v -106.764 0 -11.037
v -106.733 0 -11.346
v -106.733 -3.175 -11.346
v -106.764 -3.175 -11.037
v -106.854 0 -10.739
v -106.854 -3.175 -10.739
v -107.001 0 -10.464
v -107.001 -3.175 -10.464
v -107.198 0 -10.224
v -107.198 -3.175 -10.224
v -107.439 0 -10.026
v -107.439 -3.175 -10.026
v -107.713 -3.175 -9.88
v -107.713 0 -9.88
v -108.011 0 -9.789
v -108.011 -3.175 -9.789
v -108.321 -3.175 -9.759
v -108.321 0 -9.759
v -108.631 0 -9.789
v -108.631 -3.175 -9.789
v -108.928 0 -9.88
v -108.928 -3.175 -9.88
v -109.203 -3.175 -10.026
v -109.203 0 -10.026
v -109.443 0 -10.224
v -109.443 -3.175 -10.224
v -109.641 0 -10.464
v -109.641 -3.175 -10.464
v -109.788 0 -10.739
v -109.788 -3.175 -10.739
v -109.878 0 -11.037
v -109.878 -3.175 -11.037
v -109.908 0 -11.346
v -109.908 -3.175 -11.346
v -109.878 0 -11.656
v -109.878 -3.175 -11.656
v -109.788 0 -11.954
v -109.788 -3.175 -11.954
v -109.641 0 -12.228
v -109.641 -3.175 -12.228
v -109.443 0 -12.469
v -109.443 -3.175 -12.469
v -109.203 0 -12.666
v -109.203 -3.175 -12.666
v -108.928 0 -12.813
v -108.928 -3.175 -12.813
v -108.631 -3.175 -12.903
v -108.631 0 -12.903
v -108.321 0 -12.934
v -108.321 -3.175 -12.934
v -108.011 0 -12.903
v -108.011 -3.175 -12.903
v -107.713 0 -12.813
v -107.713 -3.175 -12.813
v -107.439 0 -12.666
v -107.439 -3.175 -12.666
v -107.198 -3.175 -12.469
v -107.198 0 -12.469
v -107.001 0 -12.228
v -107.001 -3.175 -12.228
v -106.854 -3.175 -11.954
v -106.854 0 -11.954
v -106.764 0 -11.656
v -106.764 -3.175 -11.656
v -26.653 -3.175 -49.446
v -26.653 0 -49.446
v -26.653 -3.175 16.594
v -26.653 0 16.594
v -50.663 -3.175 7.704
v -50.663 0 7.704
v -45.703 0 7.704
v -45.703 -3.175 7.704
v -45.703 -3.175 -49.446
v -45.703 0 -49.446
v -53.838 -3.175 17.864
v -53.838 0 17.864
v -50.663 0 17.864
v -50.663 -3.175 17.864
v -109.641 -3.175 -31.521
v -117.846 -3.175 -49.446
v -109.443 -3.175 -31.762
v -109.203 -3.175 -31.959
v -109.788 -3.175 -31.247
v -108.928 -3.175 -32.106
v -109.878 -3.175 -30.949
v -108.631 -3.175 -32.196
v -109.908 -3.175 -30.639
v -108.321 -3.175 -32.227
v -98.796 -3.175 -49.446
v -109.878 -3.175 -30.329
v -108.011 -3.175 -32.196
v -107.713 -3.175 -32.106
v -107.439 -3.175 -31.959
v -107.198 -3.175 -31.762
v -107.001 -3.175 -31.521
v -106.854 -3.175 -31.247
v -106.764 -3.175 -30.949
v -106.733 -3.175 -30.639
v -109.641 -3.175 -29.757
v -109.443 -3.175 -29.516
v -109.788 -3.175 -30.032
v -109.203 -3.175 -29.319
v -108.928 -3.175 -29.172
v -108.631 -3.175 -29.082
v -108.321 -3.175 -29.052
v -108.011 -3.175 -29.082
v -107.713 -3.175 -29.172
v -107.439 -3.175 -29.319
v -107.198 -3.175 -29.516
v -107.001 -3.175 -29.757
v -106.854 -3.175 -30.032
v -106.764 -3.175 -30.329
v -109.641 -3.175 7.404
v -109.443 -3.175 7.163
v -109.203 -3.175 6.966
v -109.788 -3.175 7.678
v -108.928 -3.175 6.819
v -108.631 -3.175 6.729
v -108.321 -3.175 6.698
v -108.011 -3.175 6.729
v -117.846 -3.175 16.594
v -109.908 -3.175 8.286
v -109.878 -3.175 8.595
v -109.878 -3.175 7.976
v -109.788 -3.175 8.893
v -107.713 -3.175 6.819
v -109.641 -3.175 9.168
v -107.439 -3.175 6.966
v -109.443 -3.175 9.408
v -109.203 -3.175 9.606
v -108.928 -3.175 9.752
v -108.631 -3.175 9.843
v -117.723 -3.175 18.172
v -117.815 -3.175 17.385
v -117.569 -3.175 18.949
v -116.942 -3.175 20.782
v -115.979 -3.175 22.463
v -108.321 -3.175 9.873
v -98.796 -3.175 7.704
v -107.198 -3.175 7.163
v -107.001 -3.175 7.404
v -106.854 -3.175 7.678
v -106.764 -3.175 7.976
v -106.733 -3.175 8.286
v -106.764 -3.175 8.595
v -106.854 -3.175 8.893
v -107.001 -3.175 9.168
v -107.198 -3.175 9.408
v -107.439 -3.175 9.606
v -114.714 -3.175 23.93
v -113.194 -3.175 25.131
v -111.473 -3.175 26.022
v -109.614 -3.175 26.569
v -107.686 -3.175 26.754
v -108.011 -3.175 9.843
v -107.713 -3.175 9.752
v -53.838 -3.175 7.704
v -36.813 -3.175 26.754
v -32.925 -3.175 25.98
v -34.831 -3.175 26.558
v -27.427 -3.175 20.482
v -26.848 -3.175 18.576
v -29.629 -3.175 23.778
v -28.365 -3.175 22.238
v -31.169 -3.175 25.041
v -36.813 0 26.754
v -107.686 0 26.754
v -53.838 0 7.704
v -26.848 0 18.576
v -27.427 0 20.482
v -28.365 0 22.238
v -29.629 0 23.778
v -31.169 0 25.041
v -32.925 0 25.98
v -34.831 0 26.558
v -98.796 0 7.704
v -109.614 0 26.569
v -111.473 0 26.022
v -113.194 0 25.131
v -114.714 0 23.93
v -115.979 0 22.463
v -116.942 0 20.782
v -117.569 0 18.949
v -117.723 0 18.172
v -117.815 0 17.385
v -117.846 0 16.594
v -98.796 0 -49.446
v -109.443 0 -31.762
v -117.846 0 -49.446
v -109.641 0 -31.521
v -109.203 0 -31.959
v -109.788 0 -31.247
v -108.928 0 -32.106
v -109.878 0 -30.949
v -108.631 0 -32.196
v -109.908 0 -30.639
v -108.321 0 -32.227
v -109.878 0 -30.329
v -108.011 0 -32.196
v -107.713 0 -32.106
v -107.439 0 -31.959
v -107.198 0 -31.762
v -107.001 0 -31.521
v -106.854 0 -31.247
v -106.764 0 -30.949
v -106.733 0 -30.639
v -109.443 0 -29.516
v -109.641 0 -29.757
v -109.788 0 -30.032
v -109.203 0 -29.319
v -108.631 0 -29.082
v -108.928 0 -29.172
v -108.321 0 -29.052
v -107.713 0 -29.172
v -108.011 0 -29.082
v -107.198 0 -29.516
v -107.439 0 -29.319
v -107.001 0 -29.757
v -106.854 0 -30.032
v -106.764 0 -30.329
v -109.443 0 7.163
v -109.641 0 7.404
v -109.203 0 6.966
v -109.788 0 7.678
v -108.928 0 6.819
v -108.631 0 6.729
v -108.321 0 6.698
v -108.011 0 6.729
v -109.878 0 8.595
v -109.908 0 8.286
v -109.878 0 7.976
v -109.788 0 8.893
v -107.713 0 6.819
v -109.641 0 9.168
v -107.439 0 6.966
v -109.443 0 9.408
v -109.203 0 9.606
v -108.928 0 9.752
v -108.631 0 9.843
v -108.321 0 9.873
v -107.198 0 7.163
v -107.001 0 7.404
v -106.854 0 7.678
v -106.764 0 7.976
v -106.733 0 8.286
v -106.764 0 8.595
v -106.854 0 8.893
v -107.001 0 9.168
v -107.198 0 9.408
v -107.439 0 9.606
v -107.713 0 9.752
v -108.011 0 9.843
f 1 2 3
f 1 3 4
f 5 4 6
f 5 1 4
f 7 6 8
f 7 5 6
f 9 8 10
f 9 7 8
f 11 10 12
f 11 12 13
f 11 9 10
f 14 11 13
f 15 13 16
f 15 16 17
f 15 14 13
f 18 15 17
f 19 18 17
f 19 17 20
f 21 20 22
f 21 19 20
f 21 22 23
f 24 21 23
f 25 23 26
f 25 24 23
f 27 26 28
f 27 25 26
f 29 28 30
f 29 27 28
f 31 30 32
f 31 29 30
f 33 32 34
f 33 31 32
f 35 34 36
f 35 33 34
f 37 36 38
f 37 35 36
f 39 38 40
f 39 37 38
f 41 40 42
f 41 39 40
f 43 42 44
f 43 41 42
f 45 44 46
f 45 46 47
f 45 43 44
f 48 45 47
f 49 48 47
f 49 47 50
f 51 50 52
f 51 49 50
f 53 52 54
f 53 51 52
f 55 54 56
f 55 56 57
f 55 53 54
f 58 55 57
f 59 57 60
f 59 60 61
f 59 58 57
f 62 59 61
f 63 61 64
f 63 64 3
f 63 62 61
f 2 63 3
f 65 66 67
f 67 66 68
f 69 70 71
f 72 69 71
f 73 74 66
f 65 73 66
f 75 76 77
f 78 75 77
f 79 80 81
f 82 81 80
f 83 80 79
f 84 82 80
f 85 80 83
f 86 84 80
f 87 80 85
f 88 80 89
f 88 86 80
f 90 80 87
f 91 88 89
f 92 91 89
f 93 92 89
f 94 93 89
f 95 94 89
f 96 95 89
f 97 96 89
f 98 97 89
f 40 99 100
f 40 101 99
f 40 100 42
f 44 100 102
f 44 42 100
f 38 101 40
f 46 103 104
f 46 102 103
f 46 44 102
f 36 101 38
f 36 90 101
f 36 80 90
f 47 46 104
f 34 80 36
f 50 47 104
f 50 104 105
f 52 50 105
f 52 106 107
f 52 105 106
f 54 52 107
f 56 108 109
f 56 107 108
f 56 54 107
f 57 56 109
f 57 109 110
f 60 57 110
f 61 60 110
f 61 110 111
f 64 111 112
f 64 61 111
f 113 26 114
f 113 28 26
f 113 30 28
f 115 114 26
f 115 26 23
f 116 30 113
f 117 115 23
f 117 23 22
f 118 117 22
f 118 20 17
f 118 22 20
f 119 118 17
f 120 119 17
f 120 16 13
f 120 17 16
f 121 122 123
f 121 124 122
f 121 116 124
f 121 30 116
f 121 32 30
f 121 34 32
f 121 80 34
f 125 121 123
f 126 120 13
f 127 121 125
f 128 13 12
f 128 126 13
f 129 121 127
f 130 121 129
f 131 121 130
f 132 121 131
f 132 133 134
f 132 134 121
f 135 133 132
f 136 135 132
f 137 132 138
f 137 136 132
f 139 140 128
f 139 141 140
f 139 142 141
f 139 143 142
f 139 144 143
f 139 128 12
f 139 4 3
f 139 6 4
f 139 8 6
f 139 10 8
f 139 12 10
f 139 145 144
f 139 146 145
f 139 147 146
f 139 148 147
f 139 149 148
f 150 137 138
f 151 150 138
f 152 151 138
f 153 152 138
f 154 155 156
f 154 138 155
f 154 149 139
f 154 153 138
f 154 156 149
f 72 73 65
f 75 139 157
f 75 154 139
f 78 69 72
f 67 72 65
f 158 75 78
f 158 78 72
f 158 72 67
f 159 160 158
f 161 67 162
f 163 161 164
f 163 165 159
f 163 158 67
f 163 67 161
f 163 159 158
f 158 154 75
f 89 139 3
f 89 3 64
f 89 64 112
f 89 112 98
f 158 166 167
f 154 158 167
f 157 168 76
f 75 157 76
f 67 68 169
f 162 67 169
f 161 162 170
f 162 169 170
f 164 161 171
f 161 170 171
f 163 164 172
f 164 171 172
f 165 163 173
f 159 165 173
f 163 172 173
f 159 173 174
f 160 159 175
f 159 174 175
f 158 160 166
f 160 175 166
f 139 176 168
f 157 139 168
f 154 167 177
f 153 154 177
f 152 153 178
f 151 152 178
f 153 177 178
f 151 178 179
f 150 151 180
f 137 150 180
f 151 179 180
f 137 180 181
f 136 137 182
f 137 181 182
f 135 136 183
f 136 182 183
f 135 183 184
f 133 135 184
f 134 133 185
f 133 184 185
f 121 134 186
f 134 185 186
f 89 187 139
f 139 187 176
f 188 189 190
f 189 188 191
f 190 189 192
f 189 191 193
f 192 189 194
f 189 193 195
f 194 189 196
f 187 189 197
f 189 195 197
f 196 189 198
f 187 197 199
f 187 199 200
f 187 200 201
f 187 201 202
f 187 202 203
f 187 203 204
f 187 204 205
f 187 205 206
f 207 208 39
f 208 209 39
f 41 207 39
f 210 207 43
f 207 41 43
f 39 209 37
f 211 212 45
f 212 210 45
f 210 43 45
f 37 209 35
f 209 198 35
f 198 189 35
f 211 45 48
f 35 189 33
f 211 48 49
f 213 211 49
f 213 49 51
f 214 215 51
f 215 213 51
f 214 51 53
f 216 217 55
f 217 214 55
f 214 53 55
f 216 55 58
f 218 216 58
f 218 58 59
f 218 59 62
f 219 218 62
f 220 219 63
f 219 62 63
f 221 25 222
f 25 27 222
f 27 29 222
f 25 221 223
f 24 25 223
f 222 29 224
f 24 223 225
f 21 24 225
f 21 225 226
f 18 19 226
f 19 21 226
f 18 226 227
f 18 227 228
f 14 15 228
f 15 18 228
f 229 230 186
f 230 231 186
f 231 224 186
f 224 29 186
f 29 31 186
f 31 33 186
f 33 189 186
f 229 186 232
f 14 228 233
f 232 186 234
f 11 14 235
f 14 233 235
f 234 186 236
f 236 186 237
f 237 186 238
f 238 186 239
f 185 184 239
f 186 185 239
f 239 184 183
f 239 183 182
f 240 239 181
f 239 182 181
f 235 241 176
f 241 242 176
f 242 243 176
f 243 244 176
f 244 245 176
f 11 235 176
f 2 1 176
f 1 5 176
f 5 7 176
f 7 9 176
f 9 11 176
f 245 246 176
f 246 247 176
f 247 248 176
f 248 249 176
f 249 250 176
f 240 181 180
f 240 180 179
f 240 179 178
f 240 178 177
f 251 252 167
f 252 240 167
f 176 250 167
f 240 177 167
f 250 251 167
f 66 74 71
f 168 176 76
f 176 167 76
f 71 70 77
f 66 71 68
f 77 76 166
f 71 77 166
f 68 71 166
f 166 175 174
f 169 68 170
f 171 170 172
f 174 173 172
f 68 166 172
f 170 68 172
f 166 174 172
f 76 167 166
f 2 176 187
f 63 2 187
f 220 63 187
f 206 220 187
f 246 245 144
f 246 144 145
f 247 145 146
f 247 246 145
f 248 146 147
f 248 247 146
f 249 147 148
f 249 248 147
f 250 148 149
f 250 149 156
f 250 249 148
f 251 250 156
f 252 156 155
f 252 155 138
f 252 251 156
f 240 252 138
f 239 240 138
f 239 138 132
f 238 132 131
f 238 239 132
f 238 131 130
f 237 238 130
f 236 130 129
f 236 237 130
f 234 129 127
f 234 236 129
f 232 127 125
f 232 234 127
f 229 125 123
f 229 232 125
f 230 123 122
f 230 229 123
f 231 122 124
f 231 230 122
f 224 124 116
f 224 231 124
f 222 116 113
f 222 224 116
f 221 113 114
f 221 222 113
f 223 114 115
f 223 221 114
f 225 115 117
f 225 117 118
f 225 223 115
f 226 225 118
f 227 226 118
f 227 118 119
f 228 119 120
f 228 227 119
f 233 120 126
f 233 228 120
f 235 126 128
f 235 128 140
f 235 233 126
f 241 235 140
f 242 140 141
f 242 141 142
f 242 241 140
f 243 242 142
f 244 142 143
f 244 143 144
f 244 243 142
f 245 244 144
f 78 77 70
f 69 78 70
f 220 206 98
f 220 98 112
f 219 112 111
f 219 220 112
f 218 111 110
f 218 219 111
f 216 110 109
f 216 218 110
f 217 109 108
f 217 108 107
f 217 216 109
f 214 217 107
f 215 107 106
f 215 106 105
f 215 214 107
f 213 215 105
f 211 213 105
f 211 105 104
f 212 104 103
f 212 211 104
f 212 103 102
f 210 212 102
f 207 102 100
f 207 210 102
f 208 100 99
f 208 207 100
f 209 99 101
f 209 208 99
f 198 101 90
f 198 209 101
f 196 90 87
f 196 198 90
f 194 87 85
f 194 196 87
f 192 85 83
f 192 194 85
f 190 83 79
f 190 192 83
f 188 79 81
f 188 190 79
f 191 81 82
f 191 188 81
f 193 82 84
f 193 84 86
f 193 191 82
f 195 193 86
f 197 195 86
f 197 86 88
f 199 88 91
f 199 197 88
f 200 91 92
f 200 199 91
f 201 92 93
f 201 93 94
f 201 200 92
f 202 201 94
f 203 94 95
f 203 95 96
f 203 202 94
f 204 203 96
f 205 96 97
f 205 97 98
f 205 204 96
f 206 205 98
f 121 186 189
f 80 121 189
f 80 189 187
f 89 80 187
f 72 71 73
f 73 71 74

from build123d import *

# Parameters (mm, degrees)
F0_R     = 1.5875
F1_DEPTH = 3.175


with BuildPart() as f1:
    # F0 (on Front) → F1 (new body)
    with BuildSketch(Plane.XZ):
        with BuildLine():
            Line((-45.703146, 7.703695), (-45.703146, -49.446305))
            Line((-45.703146, -49.446305), (-26.653146, -49.446305))
            Line((-26.653146, -49.446305), (-26.653146, 16.593695))
            ThreePointArc((-26.653146, 16.593695), (-29.628941, 23.7779), (-36.813146, 26.753695))
            Line((-36.813146, 26.753695), (-45.703146, 26.753695))
            Line((-45.703146, 26.753695), (-107.68587, 26.753695))
            ThreePointArc((-107.68587, 26.753695), (-113.98265, 24.567161), (-117.56917, 18.948688))
            ThreePointArc((-117.56917, 18.948688), (-117.776458, 17.779291), (-117.84587, 16.593695))
            Line((-117.84587, 16.593695), (-117.84587, 7.703695))
            Line((-117.84587, 7.703695), (-117.84587, -49.446305))
            Line((-117.84587, -49.446305), (-98.79587, -49.446305))
            Line((-98.79587, -49.446305), (-98.79587, 7.703695))
            Line((-98.79587, 7.703695), (-53.83787, 7.703695))
            Line((-53.83787, 7.703695), (-53.83787, 17.863695))
            Line((-53.83787, 17.863695), (-50.66287, 17.863695))
            Line((-50.66287, 17.863695), (-50.66287, 7.703695))
            Line((-50.66287, 7.703695), (-45.703146, 7.703695))
        make_face()
        with Locations((-108.32087, -30.639023)):
            Circle(F0_R, mode=Mode.SUBTRACT)
        with Locations((-108.32087, -11.346305)):
            Circle(F0_R, mode=Mode.SUBTRACT)
        with Locations((-108.32087, 8.285769)):
            Circle(F0_R, mode=Mode.SUBTRACT)
    extrude(amount=F1_DEPTH)


solid = f1.part
